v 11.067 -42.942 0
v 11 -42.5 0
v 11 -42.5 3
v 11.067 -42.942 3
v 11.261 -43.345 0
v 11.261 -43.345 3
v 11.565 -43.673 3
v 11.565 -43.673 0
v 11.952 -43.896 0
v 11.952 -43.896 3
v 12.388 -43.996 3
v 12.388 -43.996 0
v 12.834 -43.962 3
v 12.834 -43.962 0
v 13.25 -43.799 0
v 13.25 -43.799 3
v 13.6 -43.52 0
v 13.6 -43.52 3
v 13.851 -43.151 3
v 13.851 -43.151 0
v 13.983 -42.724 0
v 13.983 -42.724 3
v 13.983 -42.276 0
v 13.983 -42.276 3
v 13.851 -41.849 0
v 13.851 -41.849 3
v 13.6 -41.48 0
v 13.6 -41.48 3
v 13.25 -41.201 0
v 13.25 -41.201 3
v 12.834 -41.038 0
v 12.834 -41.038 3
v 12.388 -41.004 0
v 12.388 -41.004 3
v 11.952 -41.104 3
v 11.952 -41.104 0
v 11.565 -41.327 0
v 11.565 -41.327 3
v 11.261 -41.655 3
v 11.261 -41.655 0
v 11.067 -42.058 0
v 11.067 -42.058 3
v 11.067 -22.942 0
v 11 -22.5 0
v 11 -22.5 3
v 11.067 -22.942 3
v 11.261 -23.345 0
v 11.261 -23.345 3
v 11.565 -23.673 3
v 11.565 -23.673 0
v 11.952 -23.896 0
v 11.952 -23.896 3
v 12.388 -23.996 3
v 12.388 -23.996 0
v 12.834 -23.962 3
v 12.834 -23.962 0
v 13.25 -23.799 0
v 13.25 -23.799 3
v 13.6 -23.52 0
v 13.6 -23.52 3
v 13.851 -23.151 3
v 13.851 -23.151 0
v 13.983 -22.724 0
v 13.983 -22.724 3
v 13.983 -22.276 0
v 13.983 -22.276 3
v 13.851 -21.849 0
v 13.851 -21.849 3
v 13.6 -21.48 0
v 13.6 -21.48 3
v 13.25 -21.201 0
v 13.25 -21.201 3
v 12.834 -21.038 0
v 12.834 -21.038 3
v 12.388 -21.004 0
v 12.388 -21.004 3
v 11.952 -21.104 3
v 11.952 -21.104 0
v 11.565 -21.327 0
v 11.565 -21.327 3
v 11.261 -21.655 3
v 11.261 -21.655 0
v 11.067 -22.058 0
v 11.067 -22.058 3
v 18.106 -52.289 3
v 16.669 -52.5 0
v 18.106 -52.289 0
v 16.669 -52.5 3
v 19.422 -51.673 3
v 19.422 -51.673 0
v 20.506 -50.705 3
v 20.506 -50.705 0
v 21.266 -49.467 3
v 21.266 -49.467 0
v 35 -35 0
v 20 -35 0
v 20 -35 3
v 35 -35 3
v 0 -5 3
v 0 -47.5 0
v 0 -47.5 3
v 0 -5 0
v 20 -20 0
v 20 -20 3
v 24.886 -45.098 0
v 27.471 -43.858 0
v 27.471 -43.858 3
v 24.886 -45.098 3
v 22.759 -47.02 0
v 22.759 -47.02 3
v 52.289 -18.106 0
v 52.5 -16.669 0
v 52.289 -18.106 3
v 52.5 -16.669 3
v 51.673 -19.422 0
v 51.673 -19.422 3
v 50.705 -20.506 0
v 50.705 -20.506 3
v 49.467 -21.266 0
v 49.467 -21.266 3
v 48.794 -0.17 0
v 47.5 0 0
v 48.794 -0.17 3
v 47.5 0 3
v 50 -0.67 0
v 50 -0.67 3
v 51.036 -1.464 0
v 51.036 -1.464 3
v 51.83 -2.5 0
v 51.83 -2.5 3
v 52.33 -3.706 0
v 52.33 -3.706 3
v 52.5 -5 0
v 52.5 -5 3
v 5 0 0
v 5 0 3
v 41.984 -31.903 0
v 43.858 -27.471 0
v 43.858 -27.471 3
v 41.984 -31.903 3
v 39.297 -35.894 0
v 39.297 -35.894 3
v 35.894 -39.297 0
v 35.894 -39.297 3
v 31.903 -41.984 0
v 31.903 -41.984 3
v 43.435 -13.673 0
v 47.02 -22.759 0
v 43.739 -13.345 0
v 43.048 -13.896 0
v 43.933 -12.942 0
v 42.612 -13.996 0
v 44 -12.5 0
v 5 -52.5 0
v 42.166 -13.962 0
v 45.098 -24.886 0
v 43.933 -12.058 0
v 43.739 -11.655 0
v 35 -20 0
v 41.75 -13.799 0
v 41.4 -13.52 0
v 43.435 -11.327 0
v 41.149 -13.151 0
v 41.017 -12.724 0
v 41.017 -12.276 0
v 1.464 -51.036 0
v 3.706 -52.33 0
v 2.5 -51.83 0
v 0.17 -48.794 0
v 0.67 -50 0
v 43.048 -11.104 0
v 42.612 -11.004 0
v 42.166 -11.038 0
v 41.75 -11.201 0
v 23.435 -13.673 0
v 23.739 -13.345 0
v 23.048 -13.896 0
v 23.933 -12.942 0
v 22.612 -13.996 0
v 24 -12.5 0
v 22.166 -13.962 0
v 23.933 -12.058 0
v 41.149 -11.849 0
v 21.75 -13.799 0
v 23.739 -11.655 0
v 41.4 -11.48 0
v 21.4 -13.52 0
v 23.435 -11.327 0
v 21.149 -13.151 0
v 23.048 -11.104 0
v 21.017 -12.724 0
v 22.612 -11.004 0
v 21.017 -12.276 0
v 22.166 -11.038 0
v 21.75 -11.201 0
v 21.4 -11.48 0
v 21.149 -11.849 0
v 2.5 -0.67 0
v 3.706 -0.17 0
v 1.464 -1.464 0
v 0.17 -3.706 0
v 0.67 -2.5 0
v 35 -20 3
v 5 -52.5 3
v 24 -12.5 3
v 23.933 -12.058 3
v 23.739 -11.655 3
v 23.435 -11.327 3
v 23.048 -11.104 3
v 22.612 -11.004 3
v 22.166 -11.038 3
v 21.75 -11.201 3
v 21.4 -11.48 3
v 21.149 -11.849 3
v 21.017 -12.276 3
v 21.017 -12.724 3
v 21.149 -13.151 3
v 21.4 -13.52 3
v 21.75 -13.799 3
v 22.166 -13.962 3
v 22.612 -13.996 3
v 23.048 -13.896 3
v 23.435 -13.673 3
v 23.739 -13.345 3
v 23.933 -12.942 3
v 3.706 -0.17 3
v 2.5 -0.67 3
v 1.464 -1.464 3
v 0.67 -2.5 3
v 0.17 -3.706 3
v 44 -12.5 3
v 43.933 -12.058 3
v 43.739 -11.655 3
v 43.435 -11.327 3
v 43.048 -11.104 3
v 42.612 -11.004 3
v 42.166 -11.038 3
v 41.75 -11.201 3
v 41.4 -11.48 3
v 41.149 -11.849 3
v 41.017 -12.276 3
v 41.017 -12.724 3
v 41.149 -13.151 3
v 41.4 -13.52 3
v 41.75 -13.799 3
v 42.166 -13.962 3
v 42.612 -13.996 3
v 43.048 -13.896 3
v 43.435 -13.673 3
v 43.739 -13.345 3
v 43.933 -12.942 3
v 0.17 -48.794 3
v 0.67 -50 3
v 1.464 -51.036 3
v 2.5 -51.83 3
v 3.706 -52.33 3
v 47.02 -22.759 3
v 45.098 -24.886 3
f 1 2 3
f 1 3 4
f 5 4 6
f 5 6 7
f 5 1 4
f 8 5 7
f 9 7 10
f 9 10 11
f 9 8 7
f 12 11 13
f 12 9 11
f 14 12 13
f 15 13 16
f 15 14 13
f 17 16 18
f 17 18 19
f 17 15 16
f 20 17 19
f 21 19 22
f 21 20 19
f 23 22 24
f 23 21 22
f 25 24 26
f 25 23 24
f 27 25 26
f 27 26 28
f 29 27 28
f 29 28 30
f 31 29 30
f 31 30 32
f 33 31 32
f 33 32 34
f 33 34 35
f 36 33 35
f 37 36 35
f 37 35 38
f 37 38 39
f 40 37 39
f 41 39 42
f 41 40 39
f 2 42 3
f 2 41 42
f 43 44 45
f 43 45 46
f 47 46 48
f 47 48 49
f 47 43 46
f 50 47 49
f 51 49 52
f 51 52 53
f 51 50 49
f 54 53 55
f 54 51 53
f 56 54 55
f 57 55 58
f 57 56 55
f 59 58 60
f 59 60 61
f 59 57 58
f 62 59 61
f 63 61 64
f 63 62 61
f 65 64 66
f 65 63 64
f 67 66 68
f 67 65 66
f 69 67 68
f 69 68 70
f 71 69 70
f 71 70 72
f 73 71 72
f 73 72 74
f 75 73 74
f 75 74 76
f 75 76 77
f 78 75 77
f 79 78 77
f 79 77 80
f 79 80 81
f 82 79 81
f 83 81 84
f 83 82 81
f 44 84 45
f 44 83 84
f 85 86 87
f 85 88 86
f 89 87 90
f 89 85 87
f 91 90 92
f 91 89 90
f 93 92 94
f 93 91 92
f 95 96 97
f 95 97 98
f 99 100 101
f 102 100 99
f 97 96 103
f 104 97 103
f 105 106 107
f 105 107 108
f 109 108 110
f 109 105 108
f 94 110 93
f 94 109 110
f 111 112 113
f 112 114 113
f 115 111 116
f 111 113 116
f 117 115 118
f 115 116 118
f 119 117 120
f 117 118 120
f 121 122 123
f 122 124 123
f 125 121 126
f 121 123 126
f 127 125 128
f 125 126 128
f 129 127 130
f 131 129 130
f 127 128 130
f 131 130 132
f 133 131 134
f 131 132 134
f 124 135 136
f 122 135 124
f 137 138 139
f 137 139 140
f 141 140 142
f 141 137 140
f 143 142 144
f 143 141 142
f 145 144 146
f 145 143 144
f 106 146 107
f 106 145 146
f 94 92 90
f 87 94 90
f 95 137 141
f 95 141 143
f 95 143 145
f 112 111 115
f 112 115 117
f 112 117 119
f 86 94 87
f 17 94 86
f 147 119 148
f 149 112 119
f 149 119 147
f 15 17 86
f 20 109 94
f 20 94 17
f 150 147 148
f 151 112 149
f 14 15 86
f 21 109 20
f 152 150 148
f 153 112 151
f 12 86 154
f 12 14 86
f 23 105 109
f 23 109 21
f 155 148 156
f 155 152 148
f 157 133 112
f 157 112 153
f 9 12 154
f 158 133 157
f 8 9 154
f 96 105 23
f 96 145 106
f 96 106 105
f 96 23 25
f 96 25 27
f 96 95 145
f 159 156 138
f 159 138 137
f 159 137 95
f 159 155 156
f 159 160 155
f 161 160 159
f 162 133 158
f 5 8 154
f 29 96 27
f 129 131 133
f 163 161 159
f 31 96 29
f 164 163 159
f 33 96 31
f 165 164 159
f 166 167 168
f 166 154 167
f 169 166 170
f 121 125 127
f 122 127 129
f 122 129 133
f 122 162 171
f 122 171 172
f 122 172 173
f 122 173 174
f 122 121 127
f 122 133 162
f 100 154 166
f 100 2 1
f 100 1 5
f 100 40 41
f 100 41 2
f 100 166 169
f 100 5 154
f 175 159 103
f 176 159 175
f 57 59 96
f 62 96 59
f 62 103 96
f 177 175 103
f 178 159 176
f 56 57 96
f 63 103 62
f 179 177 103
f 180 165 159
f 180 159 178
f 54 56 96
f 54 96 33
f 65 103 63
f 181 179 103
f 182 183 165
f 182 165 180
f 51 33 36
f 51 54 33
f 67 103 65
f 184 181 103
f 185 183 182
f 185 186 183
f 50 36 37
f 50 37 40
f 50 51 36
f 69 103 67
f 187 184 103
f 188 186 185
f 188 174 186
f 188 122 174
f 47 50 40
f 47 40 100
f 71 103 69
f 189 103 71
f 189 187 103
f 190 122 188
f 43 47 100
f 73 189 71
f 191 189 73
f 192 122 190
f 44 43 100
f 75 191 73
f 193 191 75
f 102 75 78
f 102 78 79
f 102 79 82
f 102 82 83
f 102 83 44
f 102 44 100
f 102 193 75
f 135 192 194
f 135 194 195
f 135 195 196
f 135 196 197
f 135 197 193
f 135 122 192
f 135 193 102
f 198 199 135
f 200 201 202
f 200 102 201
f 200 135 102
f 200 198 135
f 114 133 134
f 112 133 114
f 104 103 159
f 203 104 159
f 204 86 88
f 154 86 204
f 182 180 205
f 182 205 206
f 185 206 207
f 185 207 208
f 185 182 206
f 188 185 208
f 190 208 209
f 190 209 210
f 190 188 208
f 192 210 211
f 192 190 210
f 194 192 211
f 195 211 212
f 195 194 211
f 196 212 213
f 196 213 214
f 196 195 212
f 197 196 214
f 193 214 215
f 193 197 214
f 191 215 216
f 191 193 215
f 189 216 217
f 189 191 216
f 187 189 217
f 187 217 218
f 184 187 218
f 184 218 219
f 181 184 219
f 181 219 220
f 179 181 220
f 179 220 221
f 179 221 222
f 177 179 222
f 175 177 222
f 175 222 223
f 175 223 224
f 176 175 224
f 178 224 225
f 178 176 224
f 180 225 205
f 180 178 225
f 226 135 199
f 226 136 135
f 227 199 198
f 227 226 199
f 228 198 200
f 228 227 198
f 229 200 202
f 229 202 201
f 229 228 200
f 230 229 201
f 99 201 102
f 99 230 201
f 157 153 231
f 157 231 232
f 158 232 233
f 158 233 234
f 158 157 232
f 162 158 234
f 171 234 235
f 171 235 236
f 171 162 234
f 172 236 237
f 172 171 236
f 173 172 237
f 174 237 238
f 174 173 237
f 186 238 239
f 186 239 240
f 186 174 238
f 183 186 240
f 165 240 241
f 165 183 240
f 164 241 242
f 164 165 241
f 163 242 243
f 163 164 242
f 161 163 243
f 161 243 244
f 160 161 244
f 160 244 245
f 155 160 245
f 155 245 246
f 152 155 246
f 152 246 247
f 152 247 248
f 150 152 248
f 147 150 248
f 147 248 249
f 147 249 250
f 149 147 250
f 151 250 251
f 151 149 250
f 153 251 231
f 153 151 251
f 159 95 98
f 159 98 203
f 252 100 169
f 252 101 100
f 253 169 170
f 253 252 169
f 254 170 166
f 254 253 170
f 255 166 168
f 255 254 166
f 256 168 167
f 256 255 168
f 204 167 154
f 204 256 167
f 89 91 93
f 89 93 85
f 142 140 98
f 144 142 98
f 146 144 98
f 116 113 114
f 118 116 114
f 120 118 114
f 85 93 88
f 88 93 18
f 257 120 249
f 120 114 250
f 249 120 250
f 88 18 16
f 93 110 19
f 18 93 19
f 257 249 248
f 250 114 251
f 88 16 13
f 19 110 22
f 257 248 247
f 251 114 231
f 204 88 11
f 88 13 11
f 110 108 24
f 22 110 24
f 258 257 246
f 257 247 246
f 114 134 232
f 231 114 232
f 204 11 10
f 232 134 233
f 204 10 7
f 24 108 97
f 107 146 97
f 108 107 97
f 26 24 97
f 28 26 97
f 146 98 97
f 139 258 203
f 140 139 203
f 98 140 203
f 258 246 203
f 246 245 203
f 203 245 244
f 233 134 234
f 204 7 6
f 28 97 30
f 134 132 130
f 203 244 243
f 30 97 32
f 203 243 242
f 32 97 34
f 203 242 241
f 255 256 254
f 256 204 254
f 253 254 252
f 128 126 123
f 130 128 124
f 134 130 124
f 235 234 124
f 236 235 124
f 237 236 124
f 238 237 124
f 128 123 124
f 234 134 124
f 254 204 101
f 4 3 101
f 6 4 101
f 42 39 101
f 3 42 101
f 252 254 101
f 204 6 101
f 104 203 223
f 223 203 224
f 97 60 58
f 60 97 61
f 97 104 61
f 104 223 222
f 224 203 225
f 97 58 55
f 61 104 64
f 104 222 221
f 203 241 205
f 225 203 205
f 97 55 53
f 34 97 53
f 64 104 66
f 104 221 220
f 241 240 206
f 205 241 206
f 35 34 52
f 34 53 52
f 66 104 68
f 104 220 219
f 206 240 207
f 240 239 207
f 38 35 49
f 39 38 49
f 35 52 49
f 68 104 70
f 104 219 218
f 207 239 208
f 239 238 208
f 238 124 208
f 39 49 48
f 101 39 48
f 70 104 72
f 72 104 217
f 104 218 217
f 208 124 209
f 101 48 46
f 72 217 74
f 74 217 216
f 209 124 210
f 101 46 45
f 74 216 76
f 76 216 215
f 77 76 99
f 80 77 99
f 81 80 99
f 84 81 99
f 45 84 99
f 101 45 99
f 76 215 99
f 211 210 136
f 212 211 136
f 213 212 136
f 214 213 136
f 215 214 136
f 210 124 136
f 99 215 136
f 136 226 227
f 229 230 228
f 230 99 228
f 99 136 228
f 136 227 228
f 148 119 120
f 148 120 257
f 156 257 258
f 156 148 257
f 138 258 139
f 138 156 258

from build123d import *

# Parameters (mm, degrees)
SKETCH_1_R      = 1.5
SKETCH_1_W      = 15
SKETCH_1_H      = 15
EXTRUDE_1_DEPTH = 3
FILLET_1_R      = 5


with BuildPart() as part:
    # 草图1 → 凸台-拉伸1 (new body)
    with BuildSketch(Plane.XY):
        with BuildLine():
            Line((0, 0), (52.5, 0))
            Line((52.5, 0), (52.5, -20.5))
            ThreePointArc((52.5, -20.5), (47.122398776, -22.675796862), (43.857589438, -27.47097224))
            ThreePointArc((43.857589438, -27.47097224), (37.67766953, -37.67766953), (27.47097224, -43.857589438))
            ThreePointArc((27.47097224, -43.857589438), (22.675796862, -47.122398776), (20.5, -52.5))
            Line((20.5, -52.5), (0, -52.5))
            Line((0, -52.5), (0, 0))
        make_face()
        with Locations((22.5, -12.5)):
            Circle(SKETCH_1_R, mode=Mode.SUBTRACT)
        with Locations((42.5, -12.5)):
            Circle(SKETCH_1_R, mode=Mode.SUBTRACT)
        with Locations(Location((12.5, -42.5, 0), (0, 0, 180))):
            Circle(SKETCH_1_R, mode=Mode.SUBTRACT)
        with Locations(Location((12.5, -22.5, 0), (0, 0, 180))):
            Circle(SKETCH_1_R, mode=Mode.SUBTRACT)
        with Locations((27.5, -27.5)):
            Rectangle(SKETCH_1_W, SKETCH_1_H, mode=Mode.SUBTRACT)
    extrude(amount=EXTRUDE_1_DEPTH)

    # 圆角1
    fillet_1_edges = [part.edges().sort_by_distance(p)[0] for p in [
        (0, 0, 1.5),
        (52.5, 0, 1.5),
        (52.5, -20.5, 1.5),
        (20.5, -52.5, 1.5),
        (0, -52.5, 1.5),
    ]]
    fillet(fillet_1_edges, radius=FILLET_1_R)


solid = part.part
